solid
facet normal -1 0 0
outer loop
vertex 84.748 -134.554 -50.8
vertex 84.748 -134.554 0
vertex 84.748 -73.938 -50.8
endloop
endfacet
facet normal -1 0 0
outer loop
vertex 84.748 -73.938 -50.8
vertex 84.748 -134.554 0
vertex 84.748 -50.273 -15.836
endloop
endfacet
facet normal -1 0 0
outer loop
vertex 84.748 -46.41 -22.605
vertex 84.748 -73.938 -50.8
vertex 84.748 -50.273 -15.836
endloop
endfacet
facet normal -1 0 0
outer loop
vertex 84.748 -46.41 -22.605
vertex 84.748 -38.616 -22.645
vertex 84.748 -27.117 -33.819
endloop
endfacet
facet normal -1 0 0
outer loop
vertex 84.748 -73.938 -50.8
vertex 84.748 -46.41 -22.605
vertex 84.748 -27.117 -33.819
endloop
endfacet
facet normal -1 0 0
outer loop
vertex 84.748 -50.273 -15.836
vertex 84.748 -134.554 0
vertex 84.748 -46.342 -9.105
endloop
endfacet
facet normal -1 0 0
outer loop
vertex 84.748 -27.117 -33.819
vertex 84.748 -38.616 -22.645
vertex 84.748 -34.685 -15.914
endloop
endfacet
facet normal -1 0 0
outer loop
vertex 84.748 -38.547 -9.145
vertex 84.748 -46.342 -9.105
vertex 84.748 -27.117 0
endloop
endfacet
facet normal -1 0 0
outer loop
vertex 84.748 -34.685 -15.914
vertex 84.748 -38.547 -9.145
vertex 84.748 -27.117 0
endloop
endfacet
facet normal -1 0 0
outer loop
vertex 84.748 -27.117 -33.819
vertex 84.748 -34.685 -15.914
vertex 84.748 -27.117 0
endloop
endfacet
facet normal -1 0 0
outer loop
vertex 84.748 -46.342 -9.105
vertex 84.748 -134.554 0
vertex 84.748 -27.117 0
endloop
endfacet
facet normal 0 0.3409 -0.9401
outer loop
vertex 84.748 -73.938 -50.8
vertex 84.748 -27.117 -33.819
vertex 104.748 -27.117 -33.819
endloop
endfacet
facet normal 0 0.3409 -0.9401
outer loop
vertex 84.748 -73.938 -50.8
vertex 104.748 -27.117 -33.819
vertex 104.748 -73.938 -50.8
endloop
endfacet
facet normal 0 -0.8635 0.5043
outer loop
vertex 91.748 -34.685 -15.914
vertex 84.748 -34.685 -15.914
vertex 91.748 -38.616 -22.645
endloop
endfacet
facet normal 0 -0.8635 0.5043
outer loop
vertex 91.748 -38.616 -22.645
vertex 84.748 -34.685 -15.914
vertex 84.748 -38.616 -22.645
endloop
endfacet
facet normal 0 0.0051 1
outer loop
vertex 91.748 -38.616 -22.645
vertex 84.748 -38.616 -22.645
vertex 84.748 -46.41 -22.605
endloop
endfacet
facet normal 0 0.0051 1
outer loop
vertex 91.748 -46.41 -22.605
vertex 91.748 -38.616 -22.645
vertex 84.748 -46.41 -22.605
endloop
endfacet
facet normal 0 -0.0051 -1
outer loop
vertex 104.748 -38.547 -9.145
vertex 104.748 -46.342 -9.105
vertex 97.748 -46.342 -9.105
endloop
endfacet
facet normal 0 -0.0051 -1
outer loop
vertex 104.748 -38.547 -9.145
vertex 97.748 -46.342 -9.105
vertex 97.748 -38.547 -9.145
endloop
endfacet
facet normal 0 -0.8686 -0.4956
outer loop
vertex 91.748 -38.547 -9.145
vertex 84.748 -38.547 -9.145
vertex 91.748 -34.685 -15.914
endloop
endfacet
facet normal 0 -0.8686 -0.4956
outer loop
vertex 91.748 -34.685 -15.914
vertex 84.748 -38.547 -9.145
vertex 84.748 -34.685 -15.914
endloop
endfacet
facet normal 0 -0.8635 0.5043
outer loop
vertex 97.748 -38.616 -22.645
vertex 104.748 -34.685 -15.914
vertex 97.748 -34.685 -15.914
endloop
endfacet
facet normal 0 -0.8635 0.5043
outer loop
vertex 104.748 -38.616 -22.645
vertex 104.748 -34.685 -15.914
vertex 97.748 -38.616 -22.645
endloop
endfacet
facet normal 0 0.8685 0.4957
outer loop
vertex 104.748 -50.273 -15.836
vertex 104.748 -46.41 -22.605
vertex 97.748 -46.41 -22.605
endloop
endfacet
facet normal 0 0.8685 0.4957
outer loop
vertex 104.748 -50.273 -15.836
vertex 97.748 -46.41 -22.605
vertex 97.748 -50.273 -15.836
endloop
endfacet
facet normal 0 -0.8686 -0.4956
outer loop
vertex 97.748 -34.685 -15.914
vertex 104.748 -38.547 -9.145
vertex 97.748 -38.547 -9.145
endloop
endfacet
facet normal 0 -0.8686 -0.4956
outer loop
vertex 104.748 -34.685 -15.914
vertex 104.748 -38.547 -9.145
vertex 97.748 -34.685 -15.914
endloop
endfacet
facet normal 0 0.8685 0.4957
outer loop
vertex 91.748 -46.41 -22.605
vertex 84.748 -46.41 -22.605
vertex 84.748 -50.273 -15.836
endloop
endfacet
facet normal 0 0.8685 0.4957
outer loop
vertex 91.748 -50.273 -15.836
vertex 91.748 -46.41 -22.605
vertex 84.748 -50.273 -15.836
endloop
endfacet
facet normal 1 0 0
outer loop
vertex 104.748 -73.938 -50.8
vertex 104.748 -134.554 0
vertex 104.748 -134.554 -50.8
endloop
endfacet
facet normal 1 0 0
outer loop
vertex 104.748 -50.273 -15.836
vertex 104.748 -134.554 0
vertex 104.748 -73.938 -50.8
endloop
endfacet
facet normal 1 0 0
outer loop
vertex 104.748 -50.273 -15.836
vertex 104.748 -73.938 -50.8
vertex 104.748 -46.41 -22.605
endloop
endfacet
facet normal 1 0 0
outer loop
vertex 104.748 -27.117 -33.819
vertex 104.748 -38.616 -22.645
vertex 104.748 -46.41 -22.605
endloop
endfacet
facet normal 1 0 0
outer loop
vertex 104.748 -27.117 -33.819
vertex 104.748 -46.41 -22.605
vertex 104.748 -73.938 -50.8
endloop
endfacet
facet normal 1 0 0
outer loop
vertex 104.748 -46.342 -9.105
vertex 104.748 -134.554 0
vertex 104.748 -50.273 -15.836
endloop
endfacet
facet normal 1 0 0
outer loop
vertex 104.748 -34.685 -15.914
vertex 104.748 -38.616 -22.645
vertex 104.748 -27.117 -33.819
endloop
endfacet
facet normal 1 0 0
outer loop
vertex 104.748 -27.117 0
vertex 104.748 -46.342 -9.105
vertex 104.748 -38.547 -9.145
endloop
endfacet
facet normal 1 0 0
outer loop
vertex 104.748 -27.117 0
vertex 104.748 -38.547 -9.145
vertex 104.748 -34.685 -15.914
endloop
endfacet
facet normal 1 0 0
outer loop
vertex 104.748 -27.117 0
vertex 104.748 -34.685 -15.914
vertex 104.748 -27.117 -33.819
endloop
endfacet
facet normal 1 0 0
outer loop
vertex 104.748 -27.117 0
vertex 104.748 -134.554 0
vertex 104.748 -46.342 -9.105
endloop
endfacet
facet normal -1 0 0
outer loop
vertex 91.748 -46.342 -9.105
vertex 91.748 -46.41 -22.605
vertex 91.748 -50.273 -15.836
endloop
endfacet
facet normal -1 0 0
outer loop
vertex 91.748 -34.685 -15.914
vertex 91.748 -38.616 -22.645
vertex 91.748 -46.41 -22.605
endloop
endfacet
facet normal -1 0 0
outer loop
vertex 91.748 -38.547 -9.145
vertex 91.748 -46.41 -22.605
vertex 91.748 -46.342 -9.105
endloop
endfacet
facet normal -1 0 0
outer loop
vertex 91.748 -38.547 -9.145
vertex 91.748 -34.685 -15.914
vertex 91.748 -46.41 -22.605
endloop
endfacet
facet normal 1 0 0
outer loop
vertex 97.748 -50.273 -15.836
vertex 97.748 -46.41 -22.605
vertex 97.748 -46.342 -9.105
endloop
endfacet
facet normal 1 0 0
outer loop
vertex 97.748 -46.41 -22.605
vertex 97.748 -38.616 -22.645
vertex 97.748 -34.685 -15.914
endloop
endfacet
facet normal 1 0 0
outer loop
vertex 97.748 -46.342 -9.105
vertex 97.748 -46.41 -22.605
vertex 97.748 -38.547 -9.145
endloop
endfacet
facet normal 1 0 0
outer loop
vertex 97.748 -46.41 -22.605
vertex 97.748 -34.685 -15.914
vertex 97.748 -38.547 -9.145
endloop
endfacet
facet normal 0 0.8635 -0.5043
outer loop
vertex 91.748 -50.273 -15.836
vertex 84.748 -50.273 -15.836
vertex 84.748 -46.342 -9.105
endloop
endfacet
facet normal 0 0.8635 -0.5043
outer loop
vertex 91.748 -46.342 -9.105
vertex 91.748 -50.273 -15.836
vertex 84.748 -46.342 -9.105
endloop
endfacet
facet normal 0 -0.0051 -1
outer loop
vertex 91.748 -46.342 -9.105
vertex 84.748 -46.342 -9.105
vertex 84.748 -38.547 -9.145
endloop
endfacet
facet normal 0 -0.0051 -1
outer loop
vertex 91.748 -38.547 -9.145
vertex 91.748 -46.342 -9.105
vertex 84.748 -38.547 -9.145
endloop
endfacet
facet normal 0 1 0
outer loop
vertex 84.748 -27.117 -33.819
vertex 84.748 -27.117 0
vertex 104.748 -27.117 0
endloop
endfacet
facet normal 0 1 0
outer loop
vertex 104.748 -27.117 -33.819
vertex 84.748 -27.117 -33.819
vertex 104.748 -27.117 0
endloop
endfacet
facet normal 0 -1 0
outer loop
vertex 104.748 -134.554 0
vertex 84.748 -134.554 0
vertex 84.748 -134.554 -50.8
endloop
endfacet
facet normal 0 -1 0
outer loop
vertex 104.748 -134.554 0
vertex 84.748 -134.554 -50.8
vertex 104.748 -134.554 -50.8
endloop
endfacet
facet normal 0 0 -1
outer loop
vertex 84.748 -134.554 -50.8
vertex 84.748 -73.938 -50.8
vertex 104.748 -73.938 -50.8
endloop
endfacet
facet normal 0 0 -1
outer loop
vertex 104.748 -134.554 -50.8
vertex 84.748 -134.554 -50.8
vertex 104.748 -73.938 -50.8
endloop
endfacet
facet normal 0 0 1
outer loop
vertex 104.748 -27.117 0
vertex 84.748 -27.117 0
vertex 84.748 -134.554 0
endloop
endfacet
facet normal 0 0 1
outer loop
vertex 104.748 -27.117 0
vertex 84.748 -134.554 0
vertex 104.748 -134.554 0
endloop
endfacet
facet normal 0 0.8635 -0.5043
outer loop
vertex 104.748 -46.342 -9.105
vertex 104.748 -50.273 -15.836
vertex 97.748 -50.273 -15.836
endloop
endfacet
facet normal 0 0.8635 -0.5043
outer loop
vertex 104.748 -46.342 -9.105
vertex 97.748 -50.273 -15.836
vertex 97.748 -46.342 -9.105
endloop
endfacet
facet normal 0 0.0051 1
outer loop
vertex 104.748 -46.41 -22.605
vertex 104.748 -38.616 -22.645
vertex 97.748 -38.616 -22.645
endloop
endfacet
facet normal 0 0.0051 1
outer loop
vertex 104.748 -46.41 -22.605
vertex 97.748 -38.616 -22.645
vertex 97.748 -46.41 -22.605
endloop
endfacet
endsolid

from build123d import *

# Parameters (mm, degrees)
SKETCH1_W           = 20
SKETCH1_H           = 107.436707244
BOSS_EXTRUDE1_DEPTH = 50.8
CUT_EXTRUDE2_DEPTH  = 7
CUT_EXTRUDE3_DEPTH  = 7
CUT_EXTRUDE4_REACH  = 147.208


with BuildPart() as part:
    # Sketch1 → Boss-Extrude1 (new body)
    with BuildSketch(Plane.XY):
        with Locations((94.748429341, -80.835326077)):
            Rectangle(SKETCH1_W, SKETCH1_H)
    extrude(amount=-BOSS_EXTRUDE1_DEPTH)

    # Sketch3 → Cut-Extrude2 (cut)
    with BuildSketch(Plane.ZY.offset(-84.748429341)):
        Polygon((-9.144783688, -38.547498147), (-15.914394935, -34.684550624), (-22.644611247, -38.615732175), (-22.605216312, -46.40986125), (-15.835605065, -50.272808774), (-9.105388753, -46.341627222), align=None)
    extrude(amount=-CUT_EXTRUDE2_DEPTH, mode=Mode.SUBTRACT)

    # Sketch4 → Cut-Extrude3 (cut)
    with BuildSketch(Plane(origin=(104.748429341, 0, 0), x_dir=(0, 0, -1), z_dir=(1, 0, 0))):
        Polygon((15.835605065, -50.272808774), (9.105388753, -46.341627222), (9.144783688, -38.547498147), (15.914394935, -34.684550624), (22.644611247, -38.615732175), (22.605216312, -46.40986125), align=None)
    extrude(amount=-CUT_EXTRUDE3_DEPTH, mode=Mode.SUBTRACT)

    # Sketch5 → Cut-Extrude4 (cut, up to next)
    with BuildSketch(Plane.ZY.offset(-84.748429341), mode=Mode.PRIVATE) as cut_extrude4_sk1:
        Polygon((-33.818744012, -27.116972455), (-50.8, -73.938366723), (-50.970000022, -27.115638049), align=None)
    cut_extrude4_tool1 = extrude(cut_extrude4_sk1.sketch, amount=-CUT_EXTRUDE4_REACH, mode=Mode.PRIVATE) & part.part
    add(cut_extrude4_tool1.solids().sort_by_distance((84.748429, -42.723659, -45.196248))[0], mode=Mode.SUBTRACT)


solid = part.part
